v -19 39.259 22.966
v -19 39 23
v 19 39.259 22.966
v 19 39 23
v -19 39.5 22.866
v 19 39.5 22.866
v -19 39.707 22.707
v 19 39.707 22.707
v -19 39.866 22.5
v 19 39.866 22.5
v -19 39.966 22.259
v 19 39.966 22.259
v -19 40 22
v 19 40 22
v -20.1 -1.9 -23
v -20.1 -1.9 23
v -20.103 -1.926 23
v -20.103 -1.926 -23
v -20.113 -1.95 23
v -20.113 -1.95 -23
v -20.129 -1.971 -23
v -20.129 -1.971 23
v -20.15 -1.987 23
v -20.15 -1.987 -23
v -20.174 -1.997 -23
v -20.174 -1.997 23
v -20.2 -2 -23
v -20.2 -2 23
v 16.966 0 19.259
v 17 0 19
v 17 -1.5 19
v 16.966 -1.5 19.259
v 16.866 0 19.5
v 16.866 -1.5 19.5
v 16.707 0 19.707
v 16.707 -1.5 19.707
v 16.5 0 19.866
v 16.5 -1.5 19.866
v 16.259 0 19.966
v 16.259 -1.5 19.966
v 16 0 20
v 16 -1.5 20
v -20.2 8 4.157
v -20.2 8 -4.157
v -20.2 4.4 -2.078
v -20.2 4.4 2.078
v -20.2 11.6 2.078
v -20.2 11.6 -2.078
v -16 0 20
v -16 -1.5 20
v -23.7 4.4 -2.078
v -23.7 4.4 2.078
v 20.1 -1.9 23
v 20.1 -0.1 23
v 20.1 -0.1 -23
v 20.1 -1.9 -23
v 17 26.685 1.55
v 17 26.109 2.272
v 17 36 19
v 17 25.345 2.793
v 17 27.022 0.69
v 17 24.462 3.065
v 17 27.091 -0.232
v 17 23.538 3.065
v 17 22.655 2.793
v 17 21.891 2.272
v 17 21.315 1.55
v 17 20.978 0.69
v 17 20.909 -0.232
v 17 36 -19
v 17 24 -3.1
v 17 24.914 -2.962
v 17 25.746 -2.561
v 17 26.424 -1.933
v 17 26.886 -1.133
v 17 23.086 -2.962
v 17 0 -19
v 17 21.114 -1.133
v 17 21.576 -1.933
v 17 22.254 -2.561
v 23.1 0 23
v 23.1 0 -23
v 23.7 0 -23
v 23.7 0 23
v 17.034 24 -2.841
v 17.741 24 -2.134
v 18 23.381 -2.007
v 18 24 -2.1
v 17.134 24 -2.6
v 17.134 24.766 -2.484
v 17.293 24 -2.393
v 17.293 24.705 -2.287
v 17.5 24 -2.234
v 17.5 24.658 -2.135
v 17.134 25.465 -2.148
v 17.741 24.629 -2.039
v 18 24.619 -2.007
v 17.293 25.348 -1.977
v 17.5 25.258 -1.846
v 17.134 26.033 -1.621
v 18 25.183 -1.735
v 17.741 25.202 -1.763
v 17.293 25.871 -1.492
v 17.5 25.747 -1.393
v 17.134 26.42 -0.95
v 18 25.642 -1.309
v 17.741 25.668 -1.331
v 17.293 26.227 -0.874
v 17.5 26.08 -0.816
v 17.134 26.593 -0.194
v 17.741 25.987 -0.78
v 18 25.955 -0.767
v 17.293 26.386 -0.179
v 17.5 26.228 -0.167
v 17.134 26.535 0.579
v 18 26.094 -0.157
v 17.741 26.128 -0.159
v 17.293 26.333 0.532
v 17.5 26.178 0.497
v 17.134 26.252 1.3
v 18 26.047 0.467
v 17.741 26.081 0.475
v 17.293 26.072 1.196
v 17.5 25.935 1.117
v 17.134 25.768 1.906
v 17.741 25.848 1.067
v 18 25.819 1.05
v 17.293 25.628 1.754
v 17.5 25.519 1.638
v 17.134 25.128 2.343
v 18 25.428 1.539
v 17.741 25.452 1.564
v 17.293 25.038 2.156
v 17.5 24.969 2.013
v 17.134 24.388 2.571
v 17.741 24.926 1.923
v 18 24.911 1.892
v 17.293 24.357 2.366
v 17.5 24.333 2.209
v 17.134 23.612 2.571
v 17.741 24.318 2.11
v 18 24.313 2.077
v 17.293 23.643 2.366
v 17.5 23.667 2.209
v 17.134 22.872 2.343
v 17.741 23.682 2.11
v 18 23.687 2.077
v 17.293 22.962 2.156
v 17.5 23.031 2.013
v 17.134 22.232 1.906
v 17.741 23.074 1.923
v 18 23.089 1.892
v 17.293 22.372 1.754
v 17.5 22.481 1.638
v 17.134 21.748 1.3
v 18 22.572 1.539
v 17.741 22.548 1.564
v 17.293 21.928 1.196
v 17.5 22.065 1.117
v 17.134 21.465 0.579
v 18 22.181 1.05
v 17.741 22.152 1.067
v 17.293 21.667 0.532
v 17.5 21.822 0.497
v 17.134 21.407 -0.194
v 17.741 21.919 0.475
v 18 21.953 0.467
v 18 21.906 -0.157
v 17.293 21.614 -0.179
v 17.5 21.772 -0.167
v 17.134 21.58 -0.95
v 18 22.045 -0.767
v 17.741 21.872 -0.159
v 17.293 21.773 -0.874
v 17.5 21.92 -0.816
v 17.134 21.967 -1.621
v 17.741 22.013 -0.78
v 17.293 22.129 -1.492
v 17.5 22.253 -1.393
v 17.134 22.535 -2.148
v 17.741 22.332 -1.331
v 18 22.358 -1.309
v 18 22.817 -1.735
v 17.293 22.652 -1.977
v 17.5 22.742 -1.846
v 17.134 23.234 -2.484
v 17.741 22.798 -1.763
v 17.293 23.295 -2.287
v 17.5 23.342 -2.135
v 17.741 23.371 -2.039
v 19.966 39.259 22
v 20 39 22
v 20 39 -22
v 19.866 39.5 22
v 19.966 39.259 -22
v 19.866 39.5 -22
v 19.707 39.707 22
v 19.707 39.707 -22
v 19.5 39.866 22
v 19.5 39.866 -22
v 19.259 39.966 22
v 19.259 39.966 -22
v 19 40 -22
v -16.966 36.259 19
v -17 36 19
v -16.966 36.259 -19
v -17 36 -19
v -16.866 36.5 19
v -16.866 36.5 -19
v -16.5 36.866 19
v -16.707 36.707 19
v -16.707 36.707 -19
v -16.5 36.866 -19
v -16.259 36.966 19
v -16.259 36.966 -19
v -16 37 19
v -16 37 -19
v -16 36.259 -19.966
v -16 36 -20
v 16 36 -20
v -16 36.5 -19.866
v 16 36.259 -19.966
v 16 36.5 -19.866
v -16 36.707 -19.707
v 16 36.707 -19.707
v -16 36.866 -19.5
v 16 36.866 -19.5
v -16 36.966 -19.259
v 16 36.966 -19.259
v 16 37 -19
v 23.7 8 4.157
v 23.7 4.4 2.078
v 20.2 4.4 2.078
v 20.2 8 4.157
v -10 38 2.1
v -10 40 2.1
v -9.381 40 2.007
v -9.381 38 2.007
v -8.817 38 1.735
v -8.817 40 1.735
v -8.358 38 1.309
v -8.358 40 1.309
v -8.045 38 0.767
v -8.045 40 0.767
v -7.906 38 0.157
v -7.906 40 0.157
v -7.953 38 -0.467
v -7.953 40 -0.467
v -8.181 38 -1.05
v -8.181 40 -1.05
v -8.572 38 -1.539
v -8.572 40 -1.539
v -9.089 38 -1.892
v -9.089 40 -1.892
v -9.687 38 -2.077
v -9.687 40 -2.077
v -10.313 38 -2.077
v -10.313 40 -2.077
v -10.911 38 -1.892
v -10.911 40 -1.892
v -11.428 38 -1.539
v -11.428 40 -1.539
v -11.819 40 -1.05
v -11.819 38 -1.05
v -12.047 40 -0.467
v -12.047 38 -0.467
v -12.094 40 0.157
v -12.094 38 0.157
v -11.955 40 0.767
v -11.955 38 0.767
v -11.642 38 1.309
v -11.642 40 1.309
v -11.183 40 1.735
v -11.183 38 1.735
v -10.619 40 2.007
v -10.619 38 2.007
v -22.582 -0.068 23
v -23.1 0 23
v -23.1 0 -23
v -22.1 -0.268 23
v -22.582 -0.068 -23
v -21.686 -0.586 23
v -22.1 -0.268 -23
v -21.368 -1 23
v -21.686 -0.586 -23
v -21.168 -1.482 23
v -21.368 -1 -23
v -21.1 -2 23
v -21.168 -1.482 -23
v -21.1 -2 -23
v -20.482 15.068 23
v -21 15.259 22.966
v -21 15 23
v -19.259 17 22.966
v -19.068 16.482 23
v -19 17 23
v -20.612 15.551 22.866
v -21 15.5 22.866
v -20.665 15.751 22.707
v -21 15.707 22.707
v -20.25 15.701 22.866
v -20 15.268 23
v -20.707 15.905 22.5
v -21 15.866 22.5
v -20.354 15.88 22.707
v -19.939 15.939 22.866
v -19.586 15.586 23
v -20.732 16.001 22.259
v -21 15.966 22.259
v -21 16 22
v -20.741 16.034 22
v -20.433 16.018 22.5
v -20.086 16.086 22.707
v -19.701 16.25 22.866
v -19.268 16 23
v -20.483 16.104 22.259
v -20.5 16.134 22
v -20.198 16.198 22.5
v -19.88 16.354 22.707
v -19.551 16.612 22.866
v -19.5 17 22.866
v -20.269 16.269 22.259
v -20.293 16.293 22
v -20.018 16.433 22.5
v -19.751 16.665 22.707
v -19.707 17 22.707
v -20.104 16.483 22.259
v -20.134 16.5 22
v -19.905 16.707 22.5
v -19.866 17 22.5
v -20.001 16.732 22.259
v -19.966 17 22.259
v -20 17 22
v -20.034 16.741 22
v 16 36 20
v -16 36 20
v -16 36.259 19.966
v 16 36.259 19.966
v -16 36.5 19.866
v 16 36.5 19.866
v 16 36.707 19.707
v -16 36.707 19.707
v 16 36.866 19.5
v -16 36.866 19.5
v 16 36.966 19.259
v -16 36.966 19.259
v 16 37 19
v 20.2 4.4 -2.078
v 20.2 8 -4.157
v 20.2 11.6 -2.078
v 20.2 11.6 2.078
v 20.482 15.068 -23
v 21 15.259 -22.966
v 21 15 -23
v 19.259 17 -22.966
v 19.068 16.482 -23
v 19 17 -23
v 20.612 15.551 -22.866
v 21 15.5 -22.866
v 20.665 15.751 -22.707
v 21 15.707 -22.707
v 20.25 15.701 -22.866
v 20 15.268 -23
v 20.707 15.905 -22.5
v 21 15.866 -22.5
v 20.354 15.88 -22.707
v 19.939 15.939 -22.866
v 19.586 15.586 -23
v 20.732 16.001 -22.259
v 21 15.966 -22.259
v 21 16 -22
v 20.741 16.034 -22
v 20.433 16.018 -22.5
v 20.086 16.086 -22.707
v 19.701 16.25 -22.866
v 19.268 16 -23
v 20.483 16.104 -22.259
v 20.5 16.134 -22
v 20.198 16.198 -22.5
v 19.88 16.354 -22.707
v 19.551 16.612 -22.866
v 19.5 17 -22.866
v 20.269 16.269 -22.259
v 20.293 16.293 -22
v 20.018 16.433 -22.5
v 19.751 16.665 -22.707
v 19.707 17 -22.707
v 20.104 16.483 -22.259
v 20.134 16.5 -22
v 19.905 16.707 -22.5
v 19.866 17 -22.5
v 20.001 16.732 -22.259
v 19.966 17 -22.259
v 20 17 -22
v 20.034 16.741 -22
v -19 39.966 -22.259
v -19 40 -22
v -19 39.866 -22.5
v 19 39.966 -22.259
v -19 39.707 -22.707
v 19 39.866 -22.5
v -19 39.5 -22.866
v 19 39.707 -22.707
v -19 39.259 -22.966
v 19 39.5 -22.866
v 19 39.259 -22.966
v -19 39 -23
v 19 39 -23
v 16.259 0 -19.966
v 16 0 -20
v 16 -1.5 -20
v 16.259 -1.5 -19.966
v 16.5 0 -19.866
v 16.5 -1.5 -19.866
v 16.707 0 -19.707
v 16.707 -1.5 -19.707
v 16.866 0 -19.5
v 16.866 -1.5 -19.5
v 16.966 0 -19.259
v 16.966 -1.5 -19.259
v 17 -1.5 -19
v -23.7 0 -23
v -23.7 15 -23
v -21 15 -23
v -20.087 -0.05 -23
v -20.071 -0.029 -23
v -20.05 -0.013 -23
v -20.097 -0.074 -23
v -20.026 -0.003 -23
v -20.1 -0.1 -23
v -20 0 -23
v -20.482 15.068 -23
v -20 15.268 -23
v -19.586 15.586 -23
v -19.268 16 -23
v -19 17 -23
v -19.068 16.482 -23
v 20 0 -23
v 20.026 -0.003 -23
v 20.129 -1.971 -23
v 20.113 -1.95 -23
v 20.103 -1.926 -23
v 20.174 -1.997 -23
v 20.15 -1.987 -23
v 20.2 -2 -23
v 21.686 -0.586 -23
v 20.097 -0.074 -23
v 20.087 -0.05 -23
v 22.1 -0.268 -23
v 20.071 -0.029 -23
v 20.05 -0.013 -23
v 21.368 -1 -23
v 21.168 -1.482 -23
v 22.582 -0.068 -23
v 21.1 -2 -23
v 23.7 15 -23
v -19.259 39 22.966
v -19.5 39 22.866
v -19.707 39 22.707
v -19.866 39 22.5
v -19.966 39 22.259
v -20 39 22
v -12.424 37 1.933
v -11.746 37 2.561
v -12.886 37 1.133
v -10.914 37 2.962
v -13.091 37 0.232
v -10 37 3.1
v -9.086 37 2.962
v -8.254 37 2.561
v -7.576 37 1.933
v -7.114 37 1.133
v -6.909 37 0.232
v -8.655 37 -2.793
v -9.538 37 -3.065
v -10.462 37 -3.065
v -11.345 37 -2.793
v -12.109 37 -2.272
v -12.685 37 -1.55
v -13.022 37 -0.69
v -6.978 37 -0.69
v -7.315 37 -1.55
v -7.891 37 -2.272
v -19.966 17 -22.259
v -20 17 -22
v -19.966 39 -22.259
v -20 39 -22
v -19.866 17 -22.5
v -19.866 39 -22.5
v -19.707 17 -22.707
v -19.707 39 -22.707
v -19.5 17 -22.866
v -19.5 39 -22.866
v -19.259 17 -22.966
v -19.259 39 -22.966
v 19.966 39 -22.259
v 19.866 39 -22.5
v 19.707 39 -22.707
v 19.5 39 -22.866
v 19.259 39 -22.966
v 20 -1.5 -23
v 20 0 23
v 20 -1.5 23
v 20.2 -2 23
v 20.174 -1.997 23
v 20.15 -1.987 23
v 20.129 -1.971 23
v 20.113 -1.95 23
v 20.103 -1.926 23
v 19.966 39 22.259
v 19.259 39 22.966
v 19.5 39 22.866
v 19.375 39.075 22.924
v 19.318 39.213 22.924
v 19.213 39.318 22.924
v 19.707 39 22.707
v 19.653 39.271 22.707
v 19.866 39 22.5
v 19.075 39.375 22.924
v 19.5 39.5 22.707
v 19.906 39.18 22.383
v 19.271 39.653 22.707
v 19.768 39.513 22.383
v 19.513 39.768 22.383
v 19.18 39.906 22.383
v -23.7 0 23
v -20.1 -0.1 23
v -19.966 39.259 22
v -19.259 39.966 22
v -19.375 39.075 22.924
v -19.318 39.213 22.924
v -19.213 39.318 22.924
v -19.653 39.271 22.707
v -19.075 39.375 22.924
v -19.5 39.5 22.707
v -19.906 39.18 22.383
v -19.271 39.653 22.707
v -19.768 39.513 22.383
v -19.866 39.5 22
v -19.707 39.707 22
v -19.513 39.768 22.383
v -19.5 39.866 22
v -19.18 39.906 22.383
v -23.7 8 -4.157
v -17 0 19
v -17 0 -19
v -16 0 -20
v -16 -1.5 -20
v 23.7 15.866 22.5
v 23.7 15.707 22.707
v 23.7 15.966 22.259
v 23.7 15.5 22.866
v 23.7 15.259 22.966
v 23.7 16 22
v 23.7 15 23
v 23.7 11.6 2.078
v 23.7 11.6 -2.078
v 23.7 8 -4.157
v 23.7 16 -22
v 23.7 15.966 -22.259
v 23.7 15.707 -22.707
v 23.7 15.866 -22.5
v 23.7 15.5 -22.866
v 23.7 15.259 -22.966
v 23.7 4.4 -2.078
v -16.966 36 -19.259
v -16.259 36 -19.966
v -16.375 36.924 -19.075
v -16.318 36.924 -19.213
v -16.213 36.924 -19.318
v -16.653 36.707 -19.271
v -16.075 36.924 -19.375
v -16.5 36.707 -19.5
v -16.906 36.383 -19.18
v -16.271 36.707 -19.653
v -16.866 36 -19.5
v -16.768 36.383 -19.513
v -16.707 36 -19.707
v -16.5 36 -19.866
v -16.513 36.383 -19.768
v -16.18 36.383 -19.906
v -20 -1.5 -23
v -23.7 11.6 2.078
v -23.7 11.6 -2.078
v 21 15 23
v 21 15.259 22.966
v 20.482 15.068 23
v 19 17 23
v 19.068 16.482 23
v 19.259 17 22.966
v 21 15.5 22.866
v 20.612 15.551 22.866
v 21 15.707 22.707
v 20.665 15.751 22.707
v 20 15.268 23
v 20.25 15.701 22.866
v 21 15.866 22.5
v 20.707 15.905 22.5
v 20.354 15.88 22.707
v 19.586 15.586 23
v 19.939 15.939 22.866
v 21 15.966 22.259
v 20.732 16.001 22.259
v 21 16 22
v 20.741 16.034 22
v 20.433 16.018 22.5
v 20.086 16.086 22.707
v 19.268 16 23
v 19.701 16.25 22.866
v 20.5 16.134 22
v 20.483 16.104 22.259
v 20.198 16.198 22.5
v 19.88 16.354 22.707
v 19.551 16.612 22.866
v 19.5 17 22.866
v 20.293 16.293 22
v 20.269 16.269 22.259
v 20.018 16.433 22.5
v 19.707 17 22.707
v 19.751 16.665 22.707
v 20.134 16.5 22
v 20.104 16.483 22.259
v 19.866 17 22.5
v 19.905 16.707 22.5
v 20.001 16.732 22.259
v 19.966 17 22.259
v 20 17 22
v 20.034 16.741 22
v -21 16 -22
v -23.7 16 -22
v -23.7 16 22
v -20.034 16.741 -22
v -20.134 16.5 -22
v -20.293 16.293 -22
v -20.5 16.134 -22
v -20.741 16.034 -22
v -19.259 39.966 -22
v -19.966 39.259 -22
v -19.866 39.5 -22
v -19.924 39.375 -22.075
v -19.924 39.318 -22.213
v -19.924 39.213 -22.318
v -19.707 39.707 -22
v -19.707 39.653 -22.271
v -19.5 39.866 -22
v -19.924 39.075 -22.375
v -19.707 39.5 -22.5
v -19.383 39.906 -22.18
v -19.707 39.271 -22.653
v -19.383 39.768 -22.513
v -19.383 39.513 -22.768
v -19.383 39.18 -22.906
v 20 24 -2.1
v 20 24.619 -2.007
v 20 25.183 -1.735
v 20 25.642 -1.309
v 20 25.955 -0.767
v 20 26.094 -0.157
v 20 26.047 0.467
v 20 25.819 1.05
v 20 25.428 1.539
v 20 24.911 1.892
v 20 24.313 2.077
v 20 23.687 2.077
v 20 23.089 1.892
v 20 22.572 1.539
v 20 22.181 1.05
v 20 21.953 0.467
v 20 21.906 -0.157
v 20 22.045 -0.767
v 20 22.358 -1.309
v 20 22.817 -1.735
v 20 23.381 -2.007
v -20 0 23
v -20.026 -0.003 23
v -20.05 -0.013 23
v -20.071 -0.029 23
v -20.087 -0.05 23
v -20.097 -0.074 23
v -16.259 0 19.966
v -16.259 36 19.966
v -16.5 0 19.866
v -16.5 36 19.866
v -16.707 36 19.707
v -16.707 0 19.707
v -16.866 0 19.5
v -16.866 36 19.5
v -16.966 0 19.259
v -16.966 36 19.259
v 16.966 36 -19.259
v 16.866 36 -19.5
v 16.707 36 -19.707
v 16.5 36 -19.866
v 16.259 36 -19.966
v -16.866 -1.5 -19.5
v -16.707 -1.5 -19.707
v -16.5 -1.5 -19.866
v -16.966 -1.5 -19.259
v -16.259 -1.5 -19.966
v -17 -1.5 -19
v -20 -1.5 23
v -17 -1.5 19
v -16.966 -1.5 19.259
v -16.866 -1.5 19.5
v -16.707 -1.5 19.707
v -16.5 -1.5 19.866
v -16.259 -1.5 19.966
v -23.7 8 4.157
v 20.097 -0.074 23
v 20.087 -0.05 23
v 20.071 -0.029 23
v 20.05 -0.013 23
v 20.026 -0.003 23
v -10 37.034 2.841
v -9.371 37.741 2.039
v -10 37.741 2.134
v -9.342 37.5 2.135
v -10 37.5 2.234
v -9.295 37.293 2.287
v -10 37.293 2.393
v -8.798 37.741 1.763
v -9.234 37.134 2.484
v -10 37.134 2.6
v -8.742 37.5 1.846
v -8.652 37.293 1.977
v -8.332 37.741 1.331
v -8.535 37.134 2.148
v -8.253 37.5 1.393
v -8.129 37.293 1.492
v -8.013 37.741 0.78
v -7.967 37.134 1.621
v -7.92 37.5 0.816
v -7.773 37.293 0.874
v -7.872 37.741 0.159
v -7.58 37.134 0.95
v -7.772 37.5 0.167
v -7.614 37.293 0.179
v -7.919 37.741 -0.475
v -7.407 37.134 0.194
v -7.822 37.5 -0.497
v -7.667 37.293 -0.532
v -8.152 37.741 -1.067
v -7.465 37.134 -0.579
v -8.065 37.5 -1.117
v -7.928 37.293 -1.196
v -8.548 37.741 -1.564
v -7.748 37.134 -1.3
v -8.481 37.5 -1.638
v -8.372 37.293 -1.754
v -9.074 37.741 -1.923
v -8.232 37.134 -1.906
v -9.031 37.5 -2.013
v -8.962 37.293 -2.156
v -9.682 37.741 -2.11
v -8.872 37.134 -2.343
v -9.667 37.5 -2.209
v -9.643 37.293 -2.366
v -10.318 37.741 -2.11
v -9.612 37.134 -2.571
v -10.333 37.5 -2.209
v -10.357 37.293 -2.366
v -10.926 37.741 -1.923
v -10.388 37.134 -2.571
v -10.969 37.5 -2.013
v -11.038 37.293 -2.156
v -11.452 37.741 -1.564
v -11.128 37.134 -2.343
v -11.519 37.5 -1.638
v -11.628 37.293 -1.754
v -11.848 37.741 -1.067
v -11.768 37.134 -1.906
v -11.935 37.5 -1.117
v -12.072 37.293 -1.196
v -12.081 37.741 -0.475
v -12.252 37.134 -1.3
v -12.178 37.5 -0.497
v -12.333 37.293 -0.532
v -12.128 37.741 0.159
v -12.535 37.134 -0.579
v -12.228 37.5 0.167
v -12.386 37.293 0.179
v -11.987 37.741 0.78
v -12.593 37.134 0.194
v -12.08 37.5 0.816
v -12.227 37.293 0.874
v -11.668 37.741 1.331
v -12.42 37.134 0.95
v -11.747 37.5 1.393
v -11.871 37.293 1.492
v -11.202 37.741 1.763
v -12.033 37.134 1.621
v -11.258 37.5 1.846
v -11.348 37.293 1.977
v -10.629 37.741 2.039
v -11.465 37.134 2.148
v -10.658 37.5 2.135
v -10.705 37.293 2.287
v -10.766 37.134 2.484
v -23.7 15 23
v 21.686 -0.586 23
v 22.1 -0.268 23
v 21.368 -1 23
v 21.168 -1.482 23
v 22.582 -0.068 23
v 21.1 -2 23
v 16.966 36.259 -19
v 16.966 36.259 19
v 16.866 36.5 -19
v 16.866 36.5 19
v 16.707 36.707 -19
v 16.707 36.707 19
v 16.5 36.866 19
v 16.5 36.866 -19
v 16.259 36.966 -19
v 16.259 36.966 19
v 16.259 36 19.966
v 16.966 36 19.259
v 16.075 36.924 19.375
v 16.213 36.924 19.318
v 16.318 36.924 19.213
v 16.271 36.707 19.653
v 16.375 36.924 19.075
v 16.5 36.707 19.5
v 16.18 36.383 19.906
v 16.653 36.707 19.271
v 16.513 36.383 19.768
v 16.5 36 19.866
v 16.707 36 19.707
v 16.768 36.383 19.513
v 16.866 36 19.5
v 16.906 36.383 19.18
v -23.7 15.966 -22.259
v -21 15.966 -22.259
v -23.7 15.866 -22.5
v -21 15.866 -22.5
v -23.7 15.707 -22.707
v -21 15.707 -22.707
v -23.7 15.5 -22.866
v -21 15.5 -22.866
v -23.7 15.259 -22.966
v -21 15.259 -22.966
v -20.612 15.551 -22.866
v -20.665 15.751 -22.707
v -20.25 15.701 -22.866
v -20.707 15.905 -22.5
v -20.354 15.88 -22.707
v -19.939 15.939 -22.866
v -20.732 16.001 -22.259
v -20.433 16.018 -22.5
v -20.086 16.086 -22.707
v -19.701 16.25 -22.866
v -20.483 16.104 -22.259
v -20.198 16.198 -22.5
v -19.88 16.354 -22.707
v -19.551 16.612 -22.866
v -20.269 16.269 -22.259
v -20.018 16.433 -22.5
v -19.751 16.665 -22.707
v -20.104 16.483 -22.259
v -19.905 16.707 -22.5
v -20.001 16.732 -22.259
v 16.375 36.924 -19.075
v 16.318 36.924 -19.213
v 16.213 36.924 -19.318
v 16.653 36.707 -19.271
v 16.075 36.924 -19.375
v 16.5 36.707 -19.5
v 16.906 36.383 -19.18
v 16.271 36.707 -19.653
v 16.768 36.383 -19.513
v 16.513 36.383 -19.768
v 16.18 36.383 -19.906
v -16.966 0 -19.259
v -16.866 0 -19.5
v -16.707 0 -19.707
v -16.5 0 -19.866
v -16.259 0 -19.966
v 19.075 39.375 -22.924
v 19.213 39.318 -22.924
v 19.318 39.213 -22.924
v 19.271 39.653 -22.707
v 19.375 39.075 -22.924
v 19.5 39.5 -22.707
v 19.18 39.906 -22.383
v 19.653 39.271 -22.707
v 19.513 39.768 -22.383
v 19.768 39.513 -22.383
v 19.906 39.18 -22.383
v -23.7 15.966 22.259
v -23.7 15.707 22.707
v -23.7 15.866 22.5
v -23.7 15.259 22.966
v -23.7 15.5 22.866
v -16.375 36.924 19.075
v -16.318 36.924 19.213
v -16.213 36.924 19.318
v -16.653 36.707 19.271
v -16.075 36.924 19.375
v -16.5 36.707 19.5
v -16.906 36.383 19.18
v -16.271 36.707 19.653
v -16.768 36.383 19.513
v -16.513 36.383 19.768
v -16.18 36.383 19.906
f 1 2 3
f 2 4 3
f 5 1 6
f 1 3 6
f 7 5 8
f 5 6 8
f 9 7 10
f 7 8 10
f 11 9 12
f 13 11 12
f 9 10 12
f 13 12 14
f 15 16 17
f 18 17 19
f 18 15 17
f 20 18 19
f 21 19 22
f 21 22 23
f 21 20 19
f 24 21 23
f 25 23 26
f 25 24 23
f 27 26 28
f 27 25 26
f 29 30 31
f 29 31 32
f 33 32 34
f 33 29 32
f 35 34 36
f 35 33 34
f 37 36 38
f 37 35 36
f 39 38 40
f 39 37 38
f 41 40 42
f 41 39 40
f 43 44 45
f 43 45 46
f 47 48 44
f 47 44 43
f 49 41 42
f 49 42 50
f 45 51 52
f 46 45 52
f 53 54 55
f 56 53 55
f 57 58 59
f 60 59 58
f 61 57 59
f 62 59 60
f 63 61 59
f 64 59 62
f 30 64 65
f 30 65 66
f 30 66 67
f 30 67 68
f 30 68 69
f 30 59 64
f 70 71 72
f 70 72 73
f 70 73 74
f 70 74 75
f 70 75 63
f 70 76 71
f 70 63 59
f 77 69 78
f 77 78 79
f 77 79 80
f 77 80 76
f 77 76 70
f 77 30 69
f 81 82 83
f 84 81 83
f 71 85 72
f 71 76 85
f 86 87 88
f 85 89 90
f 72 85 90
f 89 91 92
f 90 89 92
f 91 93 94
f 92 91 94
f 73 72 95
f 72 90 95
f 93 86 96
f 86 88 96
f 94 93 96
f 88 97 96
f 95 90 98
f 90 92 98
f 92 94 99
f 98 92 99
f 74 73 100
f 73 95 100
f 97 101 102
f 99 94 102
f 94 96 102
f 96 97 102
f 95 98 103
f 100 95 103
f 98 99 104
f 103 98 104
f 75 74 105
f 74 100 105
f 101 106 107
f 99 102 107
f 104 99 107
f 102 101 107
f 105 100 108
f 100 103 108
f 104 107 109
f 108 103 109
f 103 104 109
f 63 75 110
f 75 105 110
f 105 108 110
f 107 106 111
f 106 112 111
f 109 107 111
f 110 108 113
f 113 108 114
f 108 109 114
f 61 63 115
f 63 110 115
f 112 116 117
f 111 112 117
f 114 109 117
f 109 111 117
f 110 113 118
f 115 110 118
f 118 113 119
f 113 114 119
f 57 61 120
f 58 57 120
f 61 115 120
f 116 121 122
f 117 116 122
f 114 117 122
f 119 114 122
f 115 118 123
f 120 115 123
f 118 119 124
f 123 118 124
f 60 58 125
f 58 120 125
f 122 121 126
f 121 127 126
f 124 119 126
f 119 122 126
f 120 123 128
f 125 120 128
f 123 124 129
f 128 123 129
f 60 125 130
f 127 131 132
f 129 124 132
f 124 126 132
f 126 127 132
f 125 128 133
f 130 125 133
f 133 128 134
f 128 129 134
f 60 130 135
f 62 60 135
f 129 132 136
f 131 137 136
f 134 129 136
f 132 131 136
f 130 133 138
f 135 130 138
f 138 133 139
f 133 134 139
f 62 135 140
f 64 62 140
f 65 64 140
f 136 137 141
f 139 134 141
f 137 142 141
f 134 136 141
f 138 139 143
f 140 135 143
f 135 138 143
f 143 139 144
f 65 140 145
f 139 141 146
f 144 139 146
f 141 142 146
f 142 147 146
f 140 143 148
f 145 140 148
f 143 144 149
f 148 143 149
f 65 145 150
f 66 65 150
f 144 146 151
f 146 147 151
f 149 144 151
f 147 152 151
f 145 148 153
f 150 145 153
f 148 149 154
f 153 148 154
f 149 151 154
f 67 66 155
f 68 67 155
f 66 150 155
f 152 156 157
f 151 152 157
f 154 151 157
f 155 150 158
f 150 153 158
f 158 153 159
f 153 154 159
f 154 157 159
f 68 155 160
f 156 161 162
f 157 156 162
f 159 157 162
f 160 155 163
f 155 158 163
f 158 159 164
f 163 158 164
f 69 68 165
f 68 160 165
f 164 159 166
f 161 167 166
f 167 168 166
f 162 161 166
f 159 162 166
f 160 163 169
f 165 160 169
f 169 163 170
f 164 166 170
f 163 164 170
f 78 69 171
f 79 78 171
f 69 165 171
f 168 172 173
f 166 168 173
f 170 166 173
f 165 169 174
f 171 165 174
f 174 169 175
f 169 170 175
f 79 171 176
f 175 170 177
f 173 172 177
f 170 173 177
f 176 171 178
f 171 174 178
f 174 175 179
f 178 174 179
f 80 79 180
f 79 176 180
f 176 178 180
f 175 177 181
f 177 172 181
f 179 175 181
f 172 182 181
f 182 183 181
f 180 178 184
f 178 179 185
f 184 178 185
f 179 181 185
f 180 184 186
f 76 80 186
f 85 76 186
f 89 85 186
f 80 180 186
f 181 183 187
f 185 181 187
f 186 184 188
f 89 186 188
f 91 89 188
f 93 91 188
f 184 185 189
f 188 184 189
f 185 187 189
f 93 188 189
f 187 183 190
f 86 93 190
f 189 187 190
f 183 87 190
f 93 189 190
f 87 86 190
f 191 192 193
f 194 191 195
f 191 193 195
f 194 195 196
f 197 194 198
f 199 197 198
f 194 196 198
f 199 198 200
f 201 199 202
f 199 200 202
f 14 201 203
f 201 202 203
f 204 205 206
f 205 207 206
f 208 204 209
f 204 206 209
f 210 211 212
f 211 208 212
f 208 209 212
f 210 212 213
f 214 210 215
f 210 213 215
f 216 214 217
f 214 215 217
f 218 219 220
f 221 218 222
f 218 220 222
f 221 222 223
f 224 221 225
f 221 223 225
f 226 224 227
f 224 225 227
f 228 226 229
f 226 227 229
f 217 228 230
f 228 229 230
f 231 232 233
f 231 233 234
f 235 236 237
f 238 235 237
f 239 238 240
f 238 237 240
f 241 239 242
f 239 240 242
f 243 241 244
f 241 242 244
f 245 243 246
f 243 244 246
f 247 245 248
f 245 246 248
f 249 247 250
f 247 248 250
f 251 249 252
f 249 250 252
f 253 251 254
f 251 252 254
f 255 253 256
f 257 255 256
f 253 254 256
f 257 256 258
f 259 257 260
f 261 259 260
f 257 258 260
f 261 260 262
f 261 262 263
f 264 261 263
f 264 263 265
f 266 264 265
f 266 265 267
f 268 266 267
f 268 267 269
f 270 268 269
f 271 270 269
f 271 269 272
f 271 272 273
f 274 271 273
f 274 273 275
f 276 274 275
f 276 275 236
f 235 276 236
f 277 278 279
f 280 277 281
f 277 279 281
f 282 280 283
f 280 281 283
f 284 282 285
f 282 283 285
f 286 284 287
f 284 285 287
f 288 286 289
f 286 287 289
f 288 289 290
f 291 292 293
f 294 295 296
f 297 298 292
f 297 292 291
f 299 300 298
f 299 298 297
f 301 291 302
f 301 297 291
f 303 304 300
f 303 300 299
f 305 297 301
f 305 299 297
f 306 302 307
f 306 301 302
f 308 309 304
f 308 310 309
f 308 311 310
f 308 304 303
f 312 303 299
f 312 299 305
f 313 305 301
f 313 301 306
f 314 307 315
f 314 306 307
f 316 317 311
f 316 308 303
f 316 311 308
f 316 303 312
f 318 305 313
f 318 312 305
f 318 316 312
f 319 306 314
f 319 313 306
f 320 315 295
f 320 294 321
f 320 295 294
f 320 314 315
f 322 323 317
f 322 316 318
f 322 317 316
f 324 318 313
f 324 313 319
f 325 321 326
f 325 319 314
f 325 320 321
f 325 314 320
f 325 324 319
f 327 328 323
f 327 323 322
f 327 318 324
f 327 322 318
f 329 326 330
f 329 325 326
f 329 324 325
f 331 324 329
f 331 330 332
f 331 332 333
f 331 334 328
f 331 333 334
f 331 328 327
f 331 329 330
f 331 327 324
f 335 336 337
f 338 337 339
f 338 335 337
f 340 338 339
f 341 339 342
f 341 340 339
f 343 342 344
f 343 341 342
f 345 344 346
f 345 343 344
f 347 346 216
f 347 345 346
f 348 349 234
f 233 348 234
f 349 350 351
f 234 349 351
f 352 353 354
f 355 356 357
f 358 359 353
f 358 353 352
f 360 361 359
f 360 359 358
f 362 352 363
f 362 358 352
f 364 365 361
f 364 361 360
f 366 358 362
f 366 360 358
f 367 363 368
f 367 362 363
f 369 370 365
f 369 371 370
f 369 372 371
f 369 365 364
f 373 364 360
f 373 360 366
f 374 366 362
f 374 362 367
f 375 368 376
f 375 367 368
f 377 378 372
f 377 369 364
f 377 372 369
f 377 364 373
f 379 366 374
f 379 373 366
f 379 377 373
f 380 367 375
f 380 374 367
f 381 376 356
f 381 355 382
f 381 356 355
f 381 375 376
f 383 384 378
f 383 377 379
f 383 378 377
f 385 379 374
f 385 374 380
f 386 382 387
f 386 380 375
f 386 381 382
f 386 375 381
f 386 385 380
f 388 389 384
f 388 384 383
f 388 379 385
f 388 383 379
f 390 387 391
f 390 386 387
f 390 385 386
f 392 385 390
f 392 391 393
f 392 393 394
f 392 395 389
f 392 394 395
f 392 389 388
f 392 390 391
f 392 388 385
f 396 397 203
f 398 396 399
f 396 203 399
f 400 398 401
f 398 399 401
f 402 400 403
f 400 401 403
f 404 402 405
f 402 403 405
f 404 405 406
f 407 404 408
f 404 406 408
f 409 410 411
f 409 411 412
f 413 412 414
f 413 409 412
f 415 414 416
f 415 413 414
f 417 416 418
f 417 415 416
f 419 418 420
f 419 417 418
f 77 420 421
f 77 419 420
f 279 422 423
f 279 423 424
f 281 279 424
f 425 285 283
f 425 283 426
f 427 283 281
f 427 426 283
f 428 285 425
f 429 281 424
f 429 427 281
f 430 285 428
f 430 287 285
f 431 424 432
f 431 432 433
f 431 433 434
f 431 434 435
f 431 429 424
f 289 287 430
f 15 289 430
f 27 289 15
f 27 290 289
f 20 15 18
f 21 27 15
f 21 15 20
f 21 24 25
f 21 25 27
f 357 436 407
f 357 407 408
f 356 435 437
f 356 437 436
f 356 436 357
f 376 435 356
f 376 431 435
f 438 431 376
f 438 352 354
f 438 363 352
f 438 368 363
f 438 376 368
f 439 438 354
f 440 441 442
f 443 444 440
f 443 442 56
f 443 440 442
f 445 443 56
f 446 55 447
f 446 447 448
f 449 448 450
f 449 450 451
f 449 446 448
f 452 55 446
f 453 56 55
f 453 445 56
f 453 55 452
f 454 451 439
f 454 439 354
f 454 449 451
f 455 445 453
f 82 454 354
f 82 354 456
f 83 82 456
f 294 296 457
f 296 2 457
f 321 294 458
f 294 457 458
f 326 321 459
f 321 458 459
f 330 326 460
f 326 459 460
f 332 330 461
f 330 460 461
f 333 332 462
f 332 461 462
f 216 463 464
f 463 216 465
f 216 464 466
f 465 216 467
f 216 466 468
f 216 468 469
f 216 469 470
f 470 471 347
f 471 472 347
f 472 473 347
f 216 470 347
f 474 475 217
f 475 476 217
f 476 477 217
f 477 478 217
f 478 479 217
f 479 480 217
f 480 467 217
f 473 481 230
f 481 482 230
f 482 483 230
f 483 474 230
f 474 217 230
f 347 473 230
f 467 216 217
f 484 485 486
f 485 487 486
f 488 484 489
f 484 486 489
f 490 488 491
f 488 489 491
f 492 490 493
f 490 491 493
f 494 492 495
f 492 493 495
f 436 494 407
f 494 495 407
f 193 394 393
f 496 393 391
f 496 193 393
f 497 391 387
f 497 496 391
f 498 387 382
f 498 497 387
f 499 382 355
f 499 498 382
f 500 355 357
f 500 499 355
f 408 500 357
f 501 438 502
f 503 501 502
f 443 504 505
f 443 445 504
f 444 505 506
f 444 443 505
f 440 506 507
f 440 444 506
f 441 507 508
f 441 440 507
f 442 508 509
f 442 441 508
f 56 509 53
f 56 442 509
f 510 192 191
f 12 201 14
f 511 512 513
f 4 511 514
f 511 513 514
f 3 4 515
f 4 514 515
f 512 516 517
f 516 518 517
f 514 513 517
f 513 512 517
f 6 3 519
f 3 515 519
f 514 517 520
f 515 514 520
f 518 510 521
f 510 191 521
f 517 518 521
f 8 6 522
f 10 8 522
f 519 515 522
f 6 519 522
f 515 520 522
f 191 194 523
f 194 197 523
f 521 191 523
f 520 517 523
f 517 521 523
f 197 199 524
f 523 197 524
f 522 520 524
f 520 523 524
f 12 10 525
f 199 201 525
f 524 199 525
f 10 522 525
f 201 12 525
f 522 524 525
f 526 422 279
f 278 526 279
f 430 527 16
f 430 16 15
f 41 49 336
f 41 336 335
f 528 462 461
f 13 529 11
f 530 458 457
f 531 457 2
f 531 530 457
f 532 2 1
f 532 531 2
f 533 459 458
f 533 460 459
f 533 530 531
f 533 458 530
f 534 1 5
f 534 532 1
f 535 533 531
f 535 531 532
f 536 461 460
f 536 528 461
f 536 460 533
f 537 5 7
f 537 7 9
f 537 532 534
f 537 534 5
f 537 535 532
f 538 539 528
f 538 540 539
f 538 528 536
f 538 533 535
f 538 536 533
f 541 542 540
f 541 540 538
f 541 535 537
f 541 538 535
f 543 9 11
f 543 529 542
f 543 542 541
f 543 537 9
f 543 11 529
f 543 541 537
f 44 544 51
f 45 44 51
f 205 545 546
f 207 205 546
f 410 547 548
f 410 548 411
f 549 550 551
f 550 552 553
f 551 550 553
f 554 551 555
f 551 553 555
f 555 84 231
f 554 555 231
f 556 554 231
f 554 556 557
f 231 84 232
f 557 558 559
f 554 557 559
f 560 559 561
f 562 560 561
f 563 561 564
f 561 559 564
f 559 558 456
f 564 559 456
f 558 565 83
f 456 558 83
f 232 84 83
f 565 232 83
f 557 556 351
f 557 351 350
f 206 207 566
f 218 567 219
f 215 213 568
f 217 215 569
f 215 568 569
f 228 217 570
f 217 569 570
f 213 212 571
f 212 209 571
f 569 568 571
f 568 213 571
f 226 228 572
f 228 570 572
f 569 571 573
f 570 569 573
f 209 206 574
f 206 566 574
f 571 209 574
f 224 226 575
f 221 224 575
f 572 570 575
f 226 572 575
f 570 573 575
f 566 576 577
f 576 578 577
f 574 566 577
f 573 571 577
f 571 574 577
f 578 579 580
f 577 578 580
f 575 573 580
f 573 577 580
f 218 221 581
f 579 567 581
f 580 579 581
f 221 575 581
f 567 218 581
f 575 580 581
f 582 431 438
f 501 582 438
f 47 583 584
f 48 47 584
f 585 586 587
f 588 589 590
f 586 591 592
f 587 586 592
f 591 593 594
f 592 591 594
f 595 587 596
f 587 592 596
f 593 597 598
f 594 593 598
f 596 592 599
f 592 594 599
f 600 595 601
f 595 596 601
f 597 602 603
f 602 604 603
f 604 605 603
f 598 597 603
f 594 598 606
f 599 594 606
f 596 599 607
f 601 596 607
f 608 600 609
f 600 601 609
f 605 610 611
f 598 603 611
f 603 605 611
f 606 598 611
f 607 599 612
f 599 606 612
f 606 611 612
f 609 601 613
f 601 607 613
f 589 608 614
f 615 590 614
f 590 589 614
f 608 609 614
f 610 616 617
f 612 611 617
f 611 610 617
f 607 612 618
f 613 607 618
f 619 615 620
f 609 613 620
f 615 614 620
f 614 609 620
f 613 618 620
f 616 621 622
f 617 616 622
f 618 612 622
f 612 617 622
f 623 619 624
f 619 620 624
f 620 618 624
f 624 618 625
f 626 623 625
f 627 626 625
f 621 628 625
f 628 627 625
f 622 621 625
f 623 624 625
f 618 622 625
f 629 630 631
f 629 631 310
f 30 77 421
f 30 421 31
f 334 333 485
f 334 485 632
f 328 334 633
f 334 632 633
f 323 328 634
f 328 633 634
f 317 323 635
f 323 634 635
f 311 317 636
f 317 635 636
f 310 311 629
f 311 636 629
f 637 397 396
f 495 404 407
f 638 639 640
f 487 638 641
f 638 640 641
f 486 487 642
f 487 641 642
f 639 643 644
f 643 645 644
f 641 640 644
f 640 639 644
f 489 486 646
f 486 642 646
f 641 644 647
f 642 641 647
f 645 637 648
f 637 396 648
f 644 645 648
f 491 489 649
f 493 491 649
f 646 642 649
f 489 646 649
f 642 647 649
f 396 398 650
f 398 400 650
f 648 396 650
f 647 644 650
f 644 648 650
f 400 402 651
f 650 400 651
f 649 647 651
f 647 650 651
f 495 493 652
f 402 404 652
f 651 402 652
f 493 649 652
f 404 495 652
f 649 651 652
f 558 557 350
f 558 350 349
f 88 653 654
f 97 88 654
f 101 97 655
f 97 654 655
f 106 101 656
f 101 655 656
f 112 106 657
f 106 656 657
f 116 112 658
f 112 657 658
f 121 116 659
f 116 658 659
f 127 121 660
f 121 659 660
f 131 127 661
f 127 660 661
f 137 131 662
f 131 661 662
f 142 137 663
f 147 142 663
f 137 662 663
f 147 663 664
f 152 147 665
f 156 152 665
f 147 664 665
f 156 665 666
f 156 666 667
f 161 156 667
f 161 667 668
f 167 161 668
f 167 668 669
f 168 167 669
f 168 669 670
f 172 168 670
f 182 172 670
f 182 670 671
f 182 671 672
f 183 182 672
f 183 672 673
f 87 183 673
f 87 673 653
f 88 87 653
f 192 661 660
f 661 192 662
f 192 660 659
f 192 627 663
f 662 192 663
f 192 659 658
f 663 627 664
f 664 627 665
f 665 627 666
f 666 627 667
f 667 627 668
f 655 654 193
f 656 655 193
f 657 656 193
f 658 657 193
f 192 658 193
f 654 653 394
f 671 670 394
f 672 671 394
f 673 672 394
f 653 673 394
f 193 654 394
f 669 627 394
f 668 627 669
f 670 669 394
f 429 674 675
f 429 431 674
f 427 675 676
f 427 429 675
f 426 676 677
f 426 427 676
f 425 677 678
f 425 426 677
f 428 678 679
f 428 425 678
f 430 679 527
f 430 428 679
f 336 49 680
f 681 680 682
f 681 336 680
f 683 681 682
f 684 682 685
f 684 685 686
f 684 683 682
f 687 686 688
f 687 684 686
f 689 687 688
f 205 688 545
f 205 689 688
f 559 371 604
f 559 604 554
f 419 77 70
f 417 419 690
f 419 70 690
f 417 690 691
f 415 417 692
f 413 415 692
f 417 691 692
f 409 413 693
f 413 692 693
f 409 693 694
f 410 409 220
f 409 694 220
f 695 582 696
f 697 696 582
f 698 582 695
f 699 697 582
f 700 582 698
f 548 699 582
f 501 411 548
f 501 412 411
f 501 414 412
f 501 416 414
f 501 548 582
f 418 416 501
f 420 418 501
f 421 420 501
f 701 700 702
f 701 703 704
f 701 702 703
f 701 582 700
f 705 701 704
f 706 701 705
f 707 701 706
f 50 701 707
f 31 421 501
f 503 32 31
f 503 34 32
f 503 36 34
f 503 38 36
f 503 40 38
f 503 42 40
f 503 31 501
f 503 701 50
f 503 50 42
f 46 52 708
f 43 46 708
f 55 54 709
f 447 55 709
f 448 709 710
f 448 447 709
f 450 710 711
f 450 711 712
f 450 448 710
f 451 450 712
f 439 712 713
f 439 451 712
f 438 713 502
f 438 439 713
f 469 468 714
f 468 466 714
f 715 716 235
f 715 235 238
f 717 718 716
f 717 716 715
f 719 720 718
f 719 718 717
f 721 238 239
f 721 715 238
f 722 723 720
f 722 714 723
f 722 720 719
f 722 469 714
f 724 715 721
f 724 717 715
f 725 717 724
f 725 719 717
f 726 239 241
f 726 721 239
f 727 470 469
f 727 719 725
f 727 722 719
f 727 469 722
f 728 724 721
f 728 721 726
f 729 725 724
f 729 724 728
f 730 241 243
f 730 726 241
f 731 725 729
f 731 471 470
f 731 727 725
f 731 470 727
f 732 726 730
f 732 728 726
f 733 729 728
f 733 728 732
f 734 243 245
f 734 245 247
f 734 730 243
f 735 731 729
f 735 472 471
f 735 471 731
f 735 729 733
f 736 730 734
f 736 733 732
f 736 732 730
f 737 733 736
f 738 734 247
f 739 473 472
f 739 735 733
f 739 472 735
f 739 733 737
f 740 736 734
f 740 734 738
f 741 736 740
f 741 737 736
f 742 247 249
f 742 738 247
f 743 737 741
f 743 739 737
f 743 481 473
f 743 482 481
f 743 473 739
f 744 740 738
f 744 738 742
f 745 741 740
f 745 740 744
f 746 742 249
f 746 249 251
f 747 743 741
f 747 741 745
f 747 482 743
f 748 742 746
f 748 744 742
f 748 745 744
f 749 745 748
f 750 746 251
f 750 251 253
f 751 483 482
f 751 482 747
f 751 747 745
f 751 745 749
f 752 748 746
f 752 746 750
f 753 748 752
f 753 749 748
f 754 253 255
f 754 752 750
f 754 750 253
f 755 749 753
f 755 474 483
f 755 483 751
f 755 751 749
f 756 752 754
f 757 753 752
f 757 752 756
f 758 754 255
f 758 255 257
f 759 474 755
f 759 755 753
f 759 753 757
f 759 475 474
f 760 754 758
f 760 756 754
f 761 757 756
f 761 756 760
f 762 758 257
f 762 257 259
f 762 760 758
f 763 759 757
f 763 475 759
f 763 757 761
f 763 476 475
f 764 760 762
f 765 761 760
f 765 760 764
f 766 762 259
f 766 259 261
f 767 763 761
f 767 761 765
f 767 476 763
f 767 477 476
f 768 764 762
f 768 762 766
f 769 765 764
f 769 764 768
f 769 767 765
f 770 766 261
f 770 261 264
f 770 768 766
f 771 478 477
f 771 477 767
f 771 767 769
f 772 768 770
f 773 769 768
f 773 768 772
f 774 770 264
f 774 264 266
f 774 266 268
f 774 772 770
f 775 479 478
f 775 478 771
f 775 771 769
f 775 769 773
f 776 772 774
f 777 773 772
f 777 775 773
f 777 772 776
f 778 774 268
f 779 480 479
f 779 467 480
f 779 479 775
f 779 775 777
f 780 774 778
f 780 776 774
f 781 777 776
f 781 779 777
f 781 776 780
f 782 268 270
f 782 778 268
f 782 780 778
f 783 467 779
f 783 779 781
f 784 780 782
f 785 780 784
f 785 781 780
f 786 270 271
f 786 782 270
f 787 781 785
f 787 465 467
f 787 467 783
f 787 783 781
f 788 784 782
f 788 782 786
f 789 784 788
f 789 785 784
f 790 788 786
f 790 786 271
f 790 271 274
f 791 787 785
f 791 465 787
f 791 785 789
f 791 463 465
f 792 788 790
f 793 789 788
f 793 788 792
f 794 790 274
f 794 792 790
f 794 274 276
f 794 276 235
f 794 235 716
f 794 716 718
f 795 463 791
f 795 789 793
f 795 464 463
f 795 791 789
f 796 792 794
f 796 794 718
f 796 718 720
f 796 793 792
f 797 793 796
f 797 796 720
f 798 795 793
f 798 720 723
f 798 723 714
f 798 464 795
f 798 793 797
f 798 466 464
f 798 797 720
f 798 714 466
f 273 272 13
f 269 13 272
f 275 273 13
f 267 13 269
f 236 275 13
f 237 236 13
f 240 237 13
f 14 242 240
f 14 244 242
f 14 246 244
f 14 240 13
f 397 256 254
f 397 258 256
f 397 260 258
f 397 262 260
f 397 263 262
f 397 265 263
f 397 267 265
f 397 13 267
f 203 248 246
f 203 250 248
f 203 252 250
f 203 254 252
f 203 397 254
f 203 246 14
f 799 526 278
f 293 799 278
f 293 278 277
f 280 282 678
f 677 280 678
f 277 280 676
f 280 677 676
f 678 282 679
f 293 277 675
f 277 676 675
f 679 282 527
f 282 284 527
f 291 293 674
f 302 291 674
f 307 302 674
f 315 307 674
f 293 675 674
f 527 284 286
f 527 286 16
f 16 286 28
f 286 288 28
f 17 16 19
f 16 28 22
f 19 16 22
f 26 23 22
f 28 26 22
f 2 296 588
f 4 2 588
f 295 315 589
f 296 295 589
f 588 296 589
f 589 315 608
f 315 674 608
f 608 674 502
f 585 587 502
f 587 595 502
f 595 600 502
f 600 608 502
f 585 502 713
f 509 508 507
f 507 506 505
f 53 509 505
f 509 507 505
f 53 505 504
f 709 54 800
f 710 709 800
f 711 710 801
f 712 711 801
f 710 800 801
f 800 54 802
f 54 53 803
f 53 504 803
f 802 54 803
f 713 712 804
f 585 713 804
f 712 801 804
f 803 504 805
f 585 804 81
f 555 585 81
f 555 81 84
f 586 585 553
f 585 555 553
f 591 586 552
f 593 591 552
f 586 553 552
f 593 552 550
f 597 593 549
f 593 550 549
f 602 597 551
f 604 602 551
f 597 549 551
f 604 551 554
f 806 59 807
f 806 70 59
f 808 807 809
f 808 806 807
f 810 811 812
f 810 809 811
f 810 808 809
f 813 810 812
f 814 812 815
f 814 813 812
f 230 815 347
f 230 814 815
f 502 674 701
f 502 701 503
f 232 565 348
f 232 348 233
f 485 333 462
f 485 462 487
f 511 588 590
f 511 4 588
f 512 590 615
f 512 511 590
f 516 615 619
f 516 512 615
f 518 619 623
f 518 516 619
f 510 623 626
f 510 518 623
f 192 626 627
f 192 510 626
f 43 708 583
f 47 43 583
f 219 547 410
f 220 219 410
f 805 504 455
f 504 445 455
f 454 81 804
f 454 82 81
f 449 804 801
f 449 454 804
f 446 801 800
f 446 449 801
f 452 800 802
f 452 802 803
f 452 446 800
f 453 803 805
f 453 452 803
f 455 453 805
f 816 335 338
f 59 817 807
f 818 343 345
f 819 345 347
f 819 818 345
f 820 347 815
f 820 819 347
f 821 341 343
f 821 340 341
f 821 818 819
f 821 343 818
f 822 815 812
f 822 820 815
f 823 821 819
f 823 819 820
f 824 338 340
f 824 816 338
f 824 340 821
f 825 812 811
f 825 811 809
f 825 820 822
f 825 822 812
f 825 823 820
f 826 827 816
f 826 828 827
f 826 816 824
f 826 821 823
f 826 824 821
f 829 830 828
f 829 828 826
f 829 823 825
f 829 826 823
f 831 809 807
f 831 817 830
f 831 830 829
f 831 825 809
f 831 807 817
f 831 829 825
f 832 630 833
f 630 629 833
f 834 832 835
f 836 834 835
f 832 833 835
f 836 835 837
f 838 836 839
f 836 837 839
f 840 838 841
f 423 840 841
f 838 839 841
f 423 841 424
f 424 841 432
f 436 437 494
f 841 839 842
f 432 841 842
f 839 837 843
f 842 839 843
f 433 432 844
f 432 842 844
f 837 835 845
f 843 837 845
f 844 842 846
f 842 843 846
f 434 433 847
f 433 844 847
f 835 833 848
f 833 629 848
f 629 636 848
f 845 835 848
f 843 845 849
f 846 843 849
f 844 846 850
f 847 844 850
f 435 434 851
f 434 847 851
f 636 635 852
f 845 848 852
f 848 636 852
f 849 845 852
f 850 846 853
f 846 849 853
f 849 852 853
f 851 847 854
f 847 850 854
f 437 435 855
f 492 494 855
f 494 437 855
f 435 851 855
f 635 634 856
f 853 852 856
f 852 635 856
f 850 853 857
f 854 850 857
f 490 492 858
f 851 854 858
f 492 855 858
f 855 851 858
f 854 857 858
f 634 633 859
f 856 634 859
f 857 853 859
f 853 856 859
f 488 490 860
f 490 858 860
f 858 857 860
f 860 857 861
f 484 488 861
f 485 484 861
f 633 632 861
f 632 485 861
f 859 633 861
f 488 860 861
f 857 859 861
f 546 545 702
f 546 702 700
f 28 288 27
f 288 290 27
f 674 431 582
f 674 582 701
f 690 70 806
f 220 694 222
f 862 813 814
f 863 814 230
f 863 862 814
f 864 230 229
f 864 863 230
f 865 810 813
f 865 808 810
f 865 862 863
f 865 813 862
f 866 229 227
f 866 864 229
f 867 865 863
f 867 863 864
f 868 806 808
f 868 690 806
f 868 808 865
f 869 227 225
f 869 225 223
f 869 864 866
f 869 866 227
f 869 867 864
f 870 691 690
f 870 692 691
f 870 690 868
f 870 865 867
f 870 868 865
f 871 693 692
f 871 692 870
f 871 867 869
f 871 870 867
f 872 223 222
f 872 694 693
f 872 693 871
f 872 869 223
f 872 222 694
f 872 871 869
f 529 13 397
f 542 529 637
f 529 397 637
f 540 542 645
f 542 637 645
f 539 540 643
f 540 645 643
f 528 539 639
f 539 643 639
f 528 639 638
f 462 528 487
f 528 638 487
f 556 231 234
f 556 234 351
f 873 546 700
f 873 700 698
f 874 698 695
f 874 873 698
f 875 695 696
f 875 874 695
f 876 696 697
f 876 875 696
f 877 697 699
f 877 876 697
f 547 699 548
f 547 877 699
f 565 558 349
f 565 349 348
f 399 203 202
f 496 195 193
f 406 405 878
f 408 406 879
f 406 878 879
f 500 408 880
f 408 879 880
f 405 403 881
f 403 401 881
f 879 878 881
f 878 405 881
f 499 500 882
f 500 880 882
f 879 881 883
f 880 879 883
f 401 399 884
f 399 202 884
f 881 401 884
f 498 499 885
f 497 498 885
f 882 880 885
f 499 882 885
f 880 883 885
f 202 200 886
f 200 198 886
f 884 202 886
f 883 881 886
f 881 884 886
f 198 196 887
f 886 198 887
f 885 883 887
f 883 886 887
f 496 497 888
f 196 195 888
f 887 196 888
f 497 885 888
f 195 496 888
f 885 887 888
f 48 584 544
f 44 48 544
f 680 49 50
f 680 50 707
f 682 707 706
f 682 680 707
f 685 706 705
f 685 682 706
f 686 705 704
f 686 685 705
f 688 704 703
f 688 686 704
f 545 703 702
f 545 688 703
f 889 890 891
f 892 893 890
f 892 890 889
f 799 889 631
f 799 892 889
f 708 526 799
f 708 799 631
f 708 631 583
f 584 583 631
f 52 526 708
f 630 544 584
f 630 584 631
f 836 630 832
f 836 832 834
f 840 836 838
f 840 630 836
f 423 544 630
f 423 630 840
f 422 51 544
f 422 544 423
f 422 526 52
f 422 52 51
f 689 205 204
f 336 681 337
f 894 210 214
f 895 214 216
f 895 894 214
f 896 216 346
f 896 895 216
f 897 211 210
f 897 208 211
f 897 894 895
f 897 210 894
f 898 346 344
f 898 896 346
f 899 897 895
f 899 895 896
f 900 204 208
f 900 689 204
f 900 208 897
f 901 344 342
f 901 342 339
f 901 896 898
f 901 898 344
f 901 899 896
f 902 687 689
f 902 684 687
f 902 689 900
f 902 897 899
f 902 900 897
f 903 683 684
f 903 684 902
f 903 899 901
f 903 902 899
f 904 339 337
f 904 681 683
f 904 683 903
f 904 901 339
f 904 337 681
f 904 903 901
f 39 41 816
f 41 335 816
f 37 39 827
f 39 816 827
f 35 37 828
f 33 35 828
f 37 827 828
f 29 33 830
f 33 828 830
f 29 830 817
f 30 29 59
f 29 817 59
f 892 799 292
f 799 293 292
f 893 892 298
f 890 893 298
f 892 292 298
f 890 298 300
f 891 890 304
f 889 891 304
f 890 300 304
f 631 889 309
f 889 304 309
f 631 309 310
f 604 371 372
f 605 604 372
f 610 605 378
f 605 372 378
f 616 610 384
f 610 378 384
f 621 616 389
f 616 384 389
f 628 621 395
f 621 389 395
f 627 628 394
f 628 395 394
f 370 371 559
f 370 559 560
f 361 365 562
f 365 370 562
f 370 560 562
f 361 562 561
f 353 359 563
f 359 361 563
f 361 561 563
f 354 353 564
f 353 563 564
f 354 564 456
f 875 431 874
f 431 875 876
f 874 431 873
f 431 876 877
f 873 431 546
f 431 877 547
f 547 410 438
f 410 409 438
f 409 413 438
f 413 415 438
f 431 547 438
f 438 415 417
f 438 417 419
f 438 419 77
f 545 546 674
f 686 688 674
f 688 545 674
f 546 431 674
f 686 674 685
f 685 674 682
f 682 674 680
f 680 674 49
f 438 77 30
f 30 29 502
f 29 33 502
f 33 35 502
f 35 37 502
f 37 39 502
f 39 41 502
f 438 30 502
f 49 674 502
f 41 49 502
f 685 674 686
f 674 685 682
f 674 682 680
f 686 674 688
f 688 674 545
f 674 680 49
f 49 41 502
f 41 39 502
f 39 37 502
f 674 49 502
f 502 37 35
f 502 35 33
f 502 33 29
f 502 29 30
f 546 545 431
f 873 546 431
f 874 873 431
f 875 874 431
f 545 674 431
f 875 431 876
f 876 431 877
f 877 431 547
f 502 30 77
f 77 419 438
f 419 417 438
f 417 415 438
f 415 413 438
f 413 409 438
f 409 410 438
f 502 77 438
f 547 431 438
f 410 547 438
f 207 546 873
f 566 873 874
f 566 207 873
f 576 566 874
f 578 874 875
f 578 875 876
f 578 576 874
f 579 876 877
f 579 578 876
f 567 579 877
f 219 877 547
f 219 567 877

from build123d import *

# Parameters (mm, degrees)
SKETCH1_W               = 40
SKETCH1_H               = 46
BODY_DEPTH              = 40
SKETCH2_W               = 3.7
SKETCH2_H               = 46
EXTENSION_DEPTH         = 16
SKETCH5_W               = 34
SKETCH5_H               = 40
CAVITY_DEPTH            = 37
TOP_HOLE_REACH          = 53.872
SKETCH6_R               = 2.1
SIDE_HOLE_REACH         = 65.551
SKETCH7_R               = 2.1
SKETCH3_W               = 1
SKETCH3_H               = 46
LEGS_DEPTH              = 2
MOUNT_COUNTERBORE_DEPTH = 3.5
F_2MM_LEG_FILLET_R      = 2
F_0_1MM_LEG_FILLET_R    = 0.1
OUTER_BOUNDARY_FILLET_R = 1
INNER_BOUNDARY_FILLET_R = 1
SKETCH8_W               = 40
SKETCH8_H               = 46
BOSS_EXTRUDE1_DEPTH     = 1.5


with BuildPart() as part:
    # Sketch1 → Body (new body)
    with BuildSketch(Plane(origin=(0, 0, 0), x_dir=(1, 0, 0), z_dir=(0, 1, 0))):
        Rectangle(SKETCH1_W, SKETCH1_H)
    extrude(amount=BODY_DEPTH)

    # Sketch2 → Extension (add)
    with BuildSketch(Plane(origin=(0, 0, 0), x_dir=(1, 0, 0), z_dir=(0, 1, 0))):
        with Locations((-21.85, 0)):
            Rectangle(SKETCH2_W, SKETCH2_H)
        with Locations((21.85, 0)):
            Rectangle(SKETCH2_W, SKETCH2_H)
    extrude(amount=EXTENSION_DEPTH)

    # Sketch5 → Cavity (cut)
    with BuildSketch(Plane(origin=(0, 0, 0), x_dir=(1, 0, 0), z_dir=(0, 1, 0))):
        Rectangle(SKETCH5_W, SKETCH5_H)
    extrude(amount=CAVITY_DEPTH, mode=Mode.SUBTRACT)

    # Sketch6 → Top Hole (cut, up to next)
    with BuildSketch(Plane(origin=(0, 40, 0), x_dir=(1, 0, 0), z_dir=(0, 1, 0)), mode=Mode.PRIVATE) as top_hole_sk1:
        with Locations(Location((-10, 0, 0), (0, 0, 270))):
            Circle(SKETCH6_R)
    top_hole_tool1 = extrude(top_hole_sk1.sketch, amount=-TOP_HOLE_REACH, mode=Mode.PRIVATE) & part.part
    add(top_hole_tool1.solids().sort_by_distance((-10, 40, 0))[0], mode=Mode.SUBTRACT)

    # Sketch7 → Side Hole (cut, up to next)
    with BuildSketch(Plane(origin=(20, 0, 0), x_dir=(0, 0, -1), z_dir=(1, 0, 0)), mode=Mode.PRIVATE) as side_hole_sk1:
        with Locations((0, 24)):
            Circle(SKETCH7_R)
    side_hole_tool1 = extrude(side_hole_sk1.sketch, amount=-SIDE_HOLE_REACH, mode=Mode.PRIVATE) & part.part
    add(side_hole_tool1.solids().sort_by_distance((20, 24, 0))[0], mode=Mode.SUBTRACT)

    # Sketch3 → Legs (add)
    with BuildSketch(Plane(origin=(0, 0, 0), x_dir=(1, 0, 0), z_dir=(0, 1, 0))):
        with Locations((-20.6, 0)):
            Rectangle(SKETCH3_W, SKETCH3_H)
        with Locations((20.6, 0)):
            Rectangle(SKETCH3_W, SKETCH3_H)
    extrude(amount=-LEGS_DEPTH)

    # Sketch4 → Mount Counterbore (cut)
    with BuildSketch(Plane.ZY.offset(23.7)):
        Polygon((2.078460969, 11.6), (-2.078460969, 11.6), (-4.156921938, 8), (-2.078460969, 4.4), (2.078460969, 4.4), (4.156921938, 8), align=None)
    mount_counterbore = extrude(amount=-MOUNT_COUNTERBORE_DEPTH, mode=Mode.SUBTRACT)

    # Mount Counterbore Mirror: Mount Counterbore across plane
    add(mount_counterbore.mirror(Plane(origin=(0, 0, 0), x_dir=(0, 0, 1), z_dir=(1, 0, 0))), mode=Mode.SUBTRACT)

    # 2mm Leg Fillet
    f_2mm_leg_fillet_edges = [part.edges().sort_by_distance(p)[0] for p in [
        (21.1, 0, 0),
        (-21.1, 0, 0),
    ]]
    fillet(f_2mm_leg_fillet_edges, radius=F_2MM_LEG_FILLET_R - 0.0001)  # a hair under: the kernel refuses the full size

    # 0.1mm Leg Fillet
    f_0_1mm_leg_fillet_edges = [part.edges().sort_by_distance(p)[0] for p in [
        (-20.1, -2, 0),
        (-20.1, 0, 0),
        (20.1, -2, 0),
        (20.1, 0, 0),
    ]]
    fillet(f_0_1mm_leg_fillet_edges, radius=F_0_1MM_LEG_FILLET_R)

    # Outer Boundary Fillet
    outer_boundary_fillet_edges = [part.edges().sort_by_distance(p)[0] for p in [
        (20, 40, 0),
        (-20, 16, 0),
        (-21.85, 16, -23),
        (0, 40, -23),
        (-21.85, 16, 23),
        (20, 16, 0),
        (21.85, 16, 23),
        (21.85, 16, -23),
        (-20, 40, 0),
        (-20, 28, -23),
        (20, 28, -23),
        (20, 28, 23),
        (-20, 28, 23),
        (0, 40, 23),
    ]]
    fillet(outer_boundary_fillet_edges, radius=OUTER_BOUNDARY_FILLET_R)

    # Inner Boundary Fillet
    inner_boundary_fillet_edges = [part.edges().sort_by_distance(p)[0] for p in [
        (-17, 18.5, -20),
        (-17, 18.5, 20),
        (17, 18.5, 20),
        (17, 18.5, -20),
        (-17, 37, 0),
        (0, 37, 20),
        (17, 37, 0),
        (0, 37, -20),
        (-10, 37, -2.1),
        (17, 24, 2.1),
    ]]
    fillet(inner_boundary_fillet_edges, radius=INNER_BOUNDARY_FILLET_R)


with BuildPart() as body_2:
    # Sketch8 → Boss-Extrude1 (new body)
    with BuildSketch(Plane.XZ):
        Rectangle(SKETCH8_W, SKETCH8_H)
        with BuildLine():
            Line((-16, -20), (16, -20))
            ThreePointArc((16, -20), (16.707106781, -19.707106781), (17, -19))
            Line((17, -19), (17, 19))
            ThreePointArc((17, 19), (16.707106781, 19.707106781), (16, 20))
            Line((16, 20), (-16, 20))
            ThreePointArc((-16, 20), (-16.707106781, 19.707106781), (-17, 19))
            Line((-17, 19), (-17, -19))
            ThreePointArc((-17, -19), (-16.707106781, -19.707106781), (-16, -20))
        make_face(mode=Mode.SUBTRACT)
    extrude(amount=BOSS_EXTRUDE1_DEPTH)


solid = Compound([part.part, body_2.part])
